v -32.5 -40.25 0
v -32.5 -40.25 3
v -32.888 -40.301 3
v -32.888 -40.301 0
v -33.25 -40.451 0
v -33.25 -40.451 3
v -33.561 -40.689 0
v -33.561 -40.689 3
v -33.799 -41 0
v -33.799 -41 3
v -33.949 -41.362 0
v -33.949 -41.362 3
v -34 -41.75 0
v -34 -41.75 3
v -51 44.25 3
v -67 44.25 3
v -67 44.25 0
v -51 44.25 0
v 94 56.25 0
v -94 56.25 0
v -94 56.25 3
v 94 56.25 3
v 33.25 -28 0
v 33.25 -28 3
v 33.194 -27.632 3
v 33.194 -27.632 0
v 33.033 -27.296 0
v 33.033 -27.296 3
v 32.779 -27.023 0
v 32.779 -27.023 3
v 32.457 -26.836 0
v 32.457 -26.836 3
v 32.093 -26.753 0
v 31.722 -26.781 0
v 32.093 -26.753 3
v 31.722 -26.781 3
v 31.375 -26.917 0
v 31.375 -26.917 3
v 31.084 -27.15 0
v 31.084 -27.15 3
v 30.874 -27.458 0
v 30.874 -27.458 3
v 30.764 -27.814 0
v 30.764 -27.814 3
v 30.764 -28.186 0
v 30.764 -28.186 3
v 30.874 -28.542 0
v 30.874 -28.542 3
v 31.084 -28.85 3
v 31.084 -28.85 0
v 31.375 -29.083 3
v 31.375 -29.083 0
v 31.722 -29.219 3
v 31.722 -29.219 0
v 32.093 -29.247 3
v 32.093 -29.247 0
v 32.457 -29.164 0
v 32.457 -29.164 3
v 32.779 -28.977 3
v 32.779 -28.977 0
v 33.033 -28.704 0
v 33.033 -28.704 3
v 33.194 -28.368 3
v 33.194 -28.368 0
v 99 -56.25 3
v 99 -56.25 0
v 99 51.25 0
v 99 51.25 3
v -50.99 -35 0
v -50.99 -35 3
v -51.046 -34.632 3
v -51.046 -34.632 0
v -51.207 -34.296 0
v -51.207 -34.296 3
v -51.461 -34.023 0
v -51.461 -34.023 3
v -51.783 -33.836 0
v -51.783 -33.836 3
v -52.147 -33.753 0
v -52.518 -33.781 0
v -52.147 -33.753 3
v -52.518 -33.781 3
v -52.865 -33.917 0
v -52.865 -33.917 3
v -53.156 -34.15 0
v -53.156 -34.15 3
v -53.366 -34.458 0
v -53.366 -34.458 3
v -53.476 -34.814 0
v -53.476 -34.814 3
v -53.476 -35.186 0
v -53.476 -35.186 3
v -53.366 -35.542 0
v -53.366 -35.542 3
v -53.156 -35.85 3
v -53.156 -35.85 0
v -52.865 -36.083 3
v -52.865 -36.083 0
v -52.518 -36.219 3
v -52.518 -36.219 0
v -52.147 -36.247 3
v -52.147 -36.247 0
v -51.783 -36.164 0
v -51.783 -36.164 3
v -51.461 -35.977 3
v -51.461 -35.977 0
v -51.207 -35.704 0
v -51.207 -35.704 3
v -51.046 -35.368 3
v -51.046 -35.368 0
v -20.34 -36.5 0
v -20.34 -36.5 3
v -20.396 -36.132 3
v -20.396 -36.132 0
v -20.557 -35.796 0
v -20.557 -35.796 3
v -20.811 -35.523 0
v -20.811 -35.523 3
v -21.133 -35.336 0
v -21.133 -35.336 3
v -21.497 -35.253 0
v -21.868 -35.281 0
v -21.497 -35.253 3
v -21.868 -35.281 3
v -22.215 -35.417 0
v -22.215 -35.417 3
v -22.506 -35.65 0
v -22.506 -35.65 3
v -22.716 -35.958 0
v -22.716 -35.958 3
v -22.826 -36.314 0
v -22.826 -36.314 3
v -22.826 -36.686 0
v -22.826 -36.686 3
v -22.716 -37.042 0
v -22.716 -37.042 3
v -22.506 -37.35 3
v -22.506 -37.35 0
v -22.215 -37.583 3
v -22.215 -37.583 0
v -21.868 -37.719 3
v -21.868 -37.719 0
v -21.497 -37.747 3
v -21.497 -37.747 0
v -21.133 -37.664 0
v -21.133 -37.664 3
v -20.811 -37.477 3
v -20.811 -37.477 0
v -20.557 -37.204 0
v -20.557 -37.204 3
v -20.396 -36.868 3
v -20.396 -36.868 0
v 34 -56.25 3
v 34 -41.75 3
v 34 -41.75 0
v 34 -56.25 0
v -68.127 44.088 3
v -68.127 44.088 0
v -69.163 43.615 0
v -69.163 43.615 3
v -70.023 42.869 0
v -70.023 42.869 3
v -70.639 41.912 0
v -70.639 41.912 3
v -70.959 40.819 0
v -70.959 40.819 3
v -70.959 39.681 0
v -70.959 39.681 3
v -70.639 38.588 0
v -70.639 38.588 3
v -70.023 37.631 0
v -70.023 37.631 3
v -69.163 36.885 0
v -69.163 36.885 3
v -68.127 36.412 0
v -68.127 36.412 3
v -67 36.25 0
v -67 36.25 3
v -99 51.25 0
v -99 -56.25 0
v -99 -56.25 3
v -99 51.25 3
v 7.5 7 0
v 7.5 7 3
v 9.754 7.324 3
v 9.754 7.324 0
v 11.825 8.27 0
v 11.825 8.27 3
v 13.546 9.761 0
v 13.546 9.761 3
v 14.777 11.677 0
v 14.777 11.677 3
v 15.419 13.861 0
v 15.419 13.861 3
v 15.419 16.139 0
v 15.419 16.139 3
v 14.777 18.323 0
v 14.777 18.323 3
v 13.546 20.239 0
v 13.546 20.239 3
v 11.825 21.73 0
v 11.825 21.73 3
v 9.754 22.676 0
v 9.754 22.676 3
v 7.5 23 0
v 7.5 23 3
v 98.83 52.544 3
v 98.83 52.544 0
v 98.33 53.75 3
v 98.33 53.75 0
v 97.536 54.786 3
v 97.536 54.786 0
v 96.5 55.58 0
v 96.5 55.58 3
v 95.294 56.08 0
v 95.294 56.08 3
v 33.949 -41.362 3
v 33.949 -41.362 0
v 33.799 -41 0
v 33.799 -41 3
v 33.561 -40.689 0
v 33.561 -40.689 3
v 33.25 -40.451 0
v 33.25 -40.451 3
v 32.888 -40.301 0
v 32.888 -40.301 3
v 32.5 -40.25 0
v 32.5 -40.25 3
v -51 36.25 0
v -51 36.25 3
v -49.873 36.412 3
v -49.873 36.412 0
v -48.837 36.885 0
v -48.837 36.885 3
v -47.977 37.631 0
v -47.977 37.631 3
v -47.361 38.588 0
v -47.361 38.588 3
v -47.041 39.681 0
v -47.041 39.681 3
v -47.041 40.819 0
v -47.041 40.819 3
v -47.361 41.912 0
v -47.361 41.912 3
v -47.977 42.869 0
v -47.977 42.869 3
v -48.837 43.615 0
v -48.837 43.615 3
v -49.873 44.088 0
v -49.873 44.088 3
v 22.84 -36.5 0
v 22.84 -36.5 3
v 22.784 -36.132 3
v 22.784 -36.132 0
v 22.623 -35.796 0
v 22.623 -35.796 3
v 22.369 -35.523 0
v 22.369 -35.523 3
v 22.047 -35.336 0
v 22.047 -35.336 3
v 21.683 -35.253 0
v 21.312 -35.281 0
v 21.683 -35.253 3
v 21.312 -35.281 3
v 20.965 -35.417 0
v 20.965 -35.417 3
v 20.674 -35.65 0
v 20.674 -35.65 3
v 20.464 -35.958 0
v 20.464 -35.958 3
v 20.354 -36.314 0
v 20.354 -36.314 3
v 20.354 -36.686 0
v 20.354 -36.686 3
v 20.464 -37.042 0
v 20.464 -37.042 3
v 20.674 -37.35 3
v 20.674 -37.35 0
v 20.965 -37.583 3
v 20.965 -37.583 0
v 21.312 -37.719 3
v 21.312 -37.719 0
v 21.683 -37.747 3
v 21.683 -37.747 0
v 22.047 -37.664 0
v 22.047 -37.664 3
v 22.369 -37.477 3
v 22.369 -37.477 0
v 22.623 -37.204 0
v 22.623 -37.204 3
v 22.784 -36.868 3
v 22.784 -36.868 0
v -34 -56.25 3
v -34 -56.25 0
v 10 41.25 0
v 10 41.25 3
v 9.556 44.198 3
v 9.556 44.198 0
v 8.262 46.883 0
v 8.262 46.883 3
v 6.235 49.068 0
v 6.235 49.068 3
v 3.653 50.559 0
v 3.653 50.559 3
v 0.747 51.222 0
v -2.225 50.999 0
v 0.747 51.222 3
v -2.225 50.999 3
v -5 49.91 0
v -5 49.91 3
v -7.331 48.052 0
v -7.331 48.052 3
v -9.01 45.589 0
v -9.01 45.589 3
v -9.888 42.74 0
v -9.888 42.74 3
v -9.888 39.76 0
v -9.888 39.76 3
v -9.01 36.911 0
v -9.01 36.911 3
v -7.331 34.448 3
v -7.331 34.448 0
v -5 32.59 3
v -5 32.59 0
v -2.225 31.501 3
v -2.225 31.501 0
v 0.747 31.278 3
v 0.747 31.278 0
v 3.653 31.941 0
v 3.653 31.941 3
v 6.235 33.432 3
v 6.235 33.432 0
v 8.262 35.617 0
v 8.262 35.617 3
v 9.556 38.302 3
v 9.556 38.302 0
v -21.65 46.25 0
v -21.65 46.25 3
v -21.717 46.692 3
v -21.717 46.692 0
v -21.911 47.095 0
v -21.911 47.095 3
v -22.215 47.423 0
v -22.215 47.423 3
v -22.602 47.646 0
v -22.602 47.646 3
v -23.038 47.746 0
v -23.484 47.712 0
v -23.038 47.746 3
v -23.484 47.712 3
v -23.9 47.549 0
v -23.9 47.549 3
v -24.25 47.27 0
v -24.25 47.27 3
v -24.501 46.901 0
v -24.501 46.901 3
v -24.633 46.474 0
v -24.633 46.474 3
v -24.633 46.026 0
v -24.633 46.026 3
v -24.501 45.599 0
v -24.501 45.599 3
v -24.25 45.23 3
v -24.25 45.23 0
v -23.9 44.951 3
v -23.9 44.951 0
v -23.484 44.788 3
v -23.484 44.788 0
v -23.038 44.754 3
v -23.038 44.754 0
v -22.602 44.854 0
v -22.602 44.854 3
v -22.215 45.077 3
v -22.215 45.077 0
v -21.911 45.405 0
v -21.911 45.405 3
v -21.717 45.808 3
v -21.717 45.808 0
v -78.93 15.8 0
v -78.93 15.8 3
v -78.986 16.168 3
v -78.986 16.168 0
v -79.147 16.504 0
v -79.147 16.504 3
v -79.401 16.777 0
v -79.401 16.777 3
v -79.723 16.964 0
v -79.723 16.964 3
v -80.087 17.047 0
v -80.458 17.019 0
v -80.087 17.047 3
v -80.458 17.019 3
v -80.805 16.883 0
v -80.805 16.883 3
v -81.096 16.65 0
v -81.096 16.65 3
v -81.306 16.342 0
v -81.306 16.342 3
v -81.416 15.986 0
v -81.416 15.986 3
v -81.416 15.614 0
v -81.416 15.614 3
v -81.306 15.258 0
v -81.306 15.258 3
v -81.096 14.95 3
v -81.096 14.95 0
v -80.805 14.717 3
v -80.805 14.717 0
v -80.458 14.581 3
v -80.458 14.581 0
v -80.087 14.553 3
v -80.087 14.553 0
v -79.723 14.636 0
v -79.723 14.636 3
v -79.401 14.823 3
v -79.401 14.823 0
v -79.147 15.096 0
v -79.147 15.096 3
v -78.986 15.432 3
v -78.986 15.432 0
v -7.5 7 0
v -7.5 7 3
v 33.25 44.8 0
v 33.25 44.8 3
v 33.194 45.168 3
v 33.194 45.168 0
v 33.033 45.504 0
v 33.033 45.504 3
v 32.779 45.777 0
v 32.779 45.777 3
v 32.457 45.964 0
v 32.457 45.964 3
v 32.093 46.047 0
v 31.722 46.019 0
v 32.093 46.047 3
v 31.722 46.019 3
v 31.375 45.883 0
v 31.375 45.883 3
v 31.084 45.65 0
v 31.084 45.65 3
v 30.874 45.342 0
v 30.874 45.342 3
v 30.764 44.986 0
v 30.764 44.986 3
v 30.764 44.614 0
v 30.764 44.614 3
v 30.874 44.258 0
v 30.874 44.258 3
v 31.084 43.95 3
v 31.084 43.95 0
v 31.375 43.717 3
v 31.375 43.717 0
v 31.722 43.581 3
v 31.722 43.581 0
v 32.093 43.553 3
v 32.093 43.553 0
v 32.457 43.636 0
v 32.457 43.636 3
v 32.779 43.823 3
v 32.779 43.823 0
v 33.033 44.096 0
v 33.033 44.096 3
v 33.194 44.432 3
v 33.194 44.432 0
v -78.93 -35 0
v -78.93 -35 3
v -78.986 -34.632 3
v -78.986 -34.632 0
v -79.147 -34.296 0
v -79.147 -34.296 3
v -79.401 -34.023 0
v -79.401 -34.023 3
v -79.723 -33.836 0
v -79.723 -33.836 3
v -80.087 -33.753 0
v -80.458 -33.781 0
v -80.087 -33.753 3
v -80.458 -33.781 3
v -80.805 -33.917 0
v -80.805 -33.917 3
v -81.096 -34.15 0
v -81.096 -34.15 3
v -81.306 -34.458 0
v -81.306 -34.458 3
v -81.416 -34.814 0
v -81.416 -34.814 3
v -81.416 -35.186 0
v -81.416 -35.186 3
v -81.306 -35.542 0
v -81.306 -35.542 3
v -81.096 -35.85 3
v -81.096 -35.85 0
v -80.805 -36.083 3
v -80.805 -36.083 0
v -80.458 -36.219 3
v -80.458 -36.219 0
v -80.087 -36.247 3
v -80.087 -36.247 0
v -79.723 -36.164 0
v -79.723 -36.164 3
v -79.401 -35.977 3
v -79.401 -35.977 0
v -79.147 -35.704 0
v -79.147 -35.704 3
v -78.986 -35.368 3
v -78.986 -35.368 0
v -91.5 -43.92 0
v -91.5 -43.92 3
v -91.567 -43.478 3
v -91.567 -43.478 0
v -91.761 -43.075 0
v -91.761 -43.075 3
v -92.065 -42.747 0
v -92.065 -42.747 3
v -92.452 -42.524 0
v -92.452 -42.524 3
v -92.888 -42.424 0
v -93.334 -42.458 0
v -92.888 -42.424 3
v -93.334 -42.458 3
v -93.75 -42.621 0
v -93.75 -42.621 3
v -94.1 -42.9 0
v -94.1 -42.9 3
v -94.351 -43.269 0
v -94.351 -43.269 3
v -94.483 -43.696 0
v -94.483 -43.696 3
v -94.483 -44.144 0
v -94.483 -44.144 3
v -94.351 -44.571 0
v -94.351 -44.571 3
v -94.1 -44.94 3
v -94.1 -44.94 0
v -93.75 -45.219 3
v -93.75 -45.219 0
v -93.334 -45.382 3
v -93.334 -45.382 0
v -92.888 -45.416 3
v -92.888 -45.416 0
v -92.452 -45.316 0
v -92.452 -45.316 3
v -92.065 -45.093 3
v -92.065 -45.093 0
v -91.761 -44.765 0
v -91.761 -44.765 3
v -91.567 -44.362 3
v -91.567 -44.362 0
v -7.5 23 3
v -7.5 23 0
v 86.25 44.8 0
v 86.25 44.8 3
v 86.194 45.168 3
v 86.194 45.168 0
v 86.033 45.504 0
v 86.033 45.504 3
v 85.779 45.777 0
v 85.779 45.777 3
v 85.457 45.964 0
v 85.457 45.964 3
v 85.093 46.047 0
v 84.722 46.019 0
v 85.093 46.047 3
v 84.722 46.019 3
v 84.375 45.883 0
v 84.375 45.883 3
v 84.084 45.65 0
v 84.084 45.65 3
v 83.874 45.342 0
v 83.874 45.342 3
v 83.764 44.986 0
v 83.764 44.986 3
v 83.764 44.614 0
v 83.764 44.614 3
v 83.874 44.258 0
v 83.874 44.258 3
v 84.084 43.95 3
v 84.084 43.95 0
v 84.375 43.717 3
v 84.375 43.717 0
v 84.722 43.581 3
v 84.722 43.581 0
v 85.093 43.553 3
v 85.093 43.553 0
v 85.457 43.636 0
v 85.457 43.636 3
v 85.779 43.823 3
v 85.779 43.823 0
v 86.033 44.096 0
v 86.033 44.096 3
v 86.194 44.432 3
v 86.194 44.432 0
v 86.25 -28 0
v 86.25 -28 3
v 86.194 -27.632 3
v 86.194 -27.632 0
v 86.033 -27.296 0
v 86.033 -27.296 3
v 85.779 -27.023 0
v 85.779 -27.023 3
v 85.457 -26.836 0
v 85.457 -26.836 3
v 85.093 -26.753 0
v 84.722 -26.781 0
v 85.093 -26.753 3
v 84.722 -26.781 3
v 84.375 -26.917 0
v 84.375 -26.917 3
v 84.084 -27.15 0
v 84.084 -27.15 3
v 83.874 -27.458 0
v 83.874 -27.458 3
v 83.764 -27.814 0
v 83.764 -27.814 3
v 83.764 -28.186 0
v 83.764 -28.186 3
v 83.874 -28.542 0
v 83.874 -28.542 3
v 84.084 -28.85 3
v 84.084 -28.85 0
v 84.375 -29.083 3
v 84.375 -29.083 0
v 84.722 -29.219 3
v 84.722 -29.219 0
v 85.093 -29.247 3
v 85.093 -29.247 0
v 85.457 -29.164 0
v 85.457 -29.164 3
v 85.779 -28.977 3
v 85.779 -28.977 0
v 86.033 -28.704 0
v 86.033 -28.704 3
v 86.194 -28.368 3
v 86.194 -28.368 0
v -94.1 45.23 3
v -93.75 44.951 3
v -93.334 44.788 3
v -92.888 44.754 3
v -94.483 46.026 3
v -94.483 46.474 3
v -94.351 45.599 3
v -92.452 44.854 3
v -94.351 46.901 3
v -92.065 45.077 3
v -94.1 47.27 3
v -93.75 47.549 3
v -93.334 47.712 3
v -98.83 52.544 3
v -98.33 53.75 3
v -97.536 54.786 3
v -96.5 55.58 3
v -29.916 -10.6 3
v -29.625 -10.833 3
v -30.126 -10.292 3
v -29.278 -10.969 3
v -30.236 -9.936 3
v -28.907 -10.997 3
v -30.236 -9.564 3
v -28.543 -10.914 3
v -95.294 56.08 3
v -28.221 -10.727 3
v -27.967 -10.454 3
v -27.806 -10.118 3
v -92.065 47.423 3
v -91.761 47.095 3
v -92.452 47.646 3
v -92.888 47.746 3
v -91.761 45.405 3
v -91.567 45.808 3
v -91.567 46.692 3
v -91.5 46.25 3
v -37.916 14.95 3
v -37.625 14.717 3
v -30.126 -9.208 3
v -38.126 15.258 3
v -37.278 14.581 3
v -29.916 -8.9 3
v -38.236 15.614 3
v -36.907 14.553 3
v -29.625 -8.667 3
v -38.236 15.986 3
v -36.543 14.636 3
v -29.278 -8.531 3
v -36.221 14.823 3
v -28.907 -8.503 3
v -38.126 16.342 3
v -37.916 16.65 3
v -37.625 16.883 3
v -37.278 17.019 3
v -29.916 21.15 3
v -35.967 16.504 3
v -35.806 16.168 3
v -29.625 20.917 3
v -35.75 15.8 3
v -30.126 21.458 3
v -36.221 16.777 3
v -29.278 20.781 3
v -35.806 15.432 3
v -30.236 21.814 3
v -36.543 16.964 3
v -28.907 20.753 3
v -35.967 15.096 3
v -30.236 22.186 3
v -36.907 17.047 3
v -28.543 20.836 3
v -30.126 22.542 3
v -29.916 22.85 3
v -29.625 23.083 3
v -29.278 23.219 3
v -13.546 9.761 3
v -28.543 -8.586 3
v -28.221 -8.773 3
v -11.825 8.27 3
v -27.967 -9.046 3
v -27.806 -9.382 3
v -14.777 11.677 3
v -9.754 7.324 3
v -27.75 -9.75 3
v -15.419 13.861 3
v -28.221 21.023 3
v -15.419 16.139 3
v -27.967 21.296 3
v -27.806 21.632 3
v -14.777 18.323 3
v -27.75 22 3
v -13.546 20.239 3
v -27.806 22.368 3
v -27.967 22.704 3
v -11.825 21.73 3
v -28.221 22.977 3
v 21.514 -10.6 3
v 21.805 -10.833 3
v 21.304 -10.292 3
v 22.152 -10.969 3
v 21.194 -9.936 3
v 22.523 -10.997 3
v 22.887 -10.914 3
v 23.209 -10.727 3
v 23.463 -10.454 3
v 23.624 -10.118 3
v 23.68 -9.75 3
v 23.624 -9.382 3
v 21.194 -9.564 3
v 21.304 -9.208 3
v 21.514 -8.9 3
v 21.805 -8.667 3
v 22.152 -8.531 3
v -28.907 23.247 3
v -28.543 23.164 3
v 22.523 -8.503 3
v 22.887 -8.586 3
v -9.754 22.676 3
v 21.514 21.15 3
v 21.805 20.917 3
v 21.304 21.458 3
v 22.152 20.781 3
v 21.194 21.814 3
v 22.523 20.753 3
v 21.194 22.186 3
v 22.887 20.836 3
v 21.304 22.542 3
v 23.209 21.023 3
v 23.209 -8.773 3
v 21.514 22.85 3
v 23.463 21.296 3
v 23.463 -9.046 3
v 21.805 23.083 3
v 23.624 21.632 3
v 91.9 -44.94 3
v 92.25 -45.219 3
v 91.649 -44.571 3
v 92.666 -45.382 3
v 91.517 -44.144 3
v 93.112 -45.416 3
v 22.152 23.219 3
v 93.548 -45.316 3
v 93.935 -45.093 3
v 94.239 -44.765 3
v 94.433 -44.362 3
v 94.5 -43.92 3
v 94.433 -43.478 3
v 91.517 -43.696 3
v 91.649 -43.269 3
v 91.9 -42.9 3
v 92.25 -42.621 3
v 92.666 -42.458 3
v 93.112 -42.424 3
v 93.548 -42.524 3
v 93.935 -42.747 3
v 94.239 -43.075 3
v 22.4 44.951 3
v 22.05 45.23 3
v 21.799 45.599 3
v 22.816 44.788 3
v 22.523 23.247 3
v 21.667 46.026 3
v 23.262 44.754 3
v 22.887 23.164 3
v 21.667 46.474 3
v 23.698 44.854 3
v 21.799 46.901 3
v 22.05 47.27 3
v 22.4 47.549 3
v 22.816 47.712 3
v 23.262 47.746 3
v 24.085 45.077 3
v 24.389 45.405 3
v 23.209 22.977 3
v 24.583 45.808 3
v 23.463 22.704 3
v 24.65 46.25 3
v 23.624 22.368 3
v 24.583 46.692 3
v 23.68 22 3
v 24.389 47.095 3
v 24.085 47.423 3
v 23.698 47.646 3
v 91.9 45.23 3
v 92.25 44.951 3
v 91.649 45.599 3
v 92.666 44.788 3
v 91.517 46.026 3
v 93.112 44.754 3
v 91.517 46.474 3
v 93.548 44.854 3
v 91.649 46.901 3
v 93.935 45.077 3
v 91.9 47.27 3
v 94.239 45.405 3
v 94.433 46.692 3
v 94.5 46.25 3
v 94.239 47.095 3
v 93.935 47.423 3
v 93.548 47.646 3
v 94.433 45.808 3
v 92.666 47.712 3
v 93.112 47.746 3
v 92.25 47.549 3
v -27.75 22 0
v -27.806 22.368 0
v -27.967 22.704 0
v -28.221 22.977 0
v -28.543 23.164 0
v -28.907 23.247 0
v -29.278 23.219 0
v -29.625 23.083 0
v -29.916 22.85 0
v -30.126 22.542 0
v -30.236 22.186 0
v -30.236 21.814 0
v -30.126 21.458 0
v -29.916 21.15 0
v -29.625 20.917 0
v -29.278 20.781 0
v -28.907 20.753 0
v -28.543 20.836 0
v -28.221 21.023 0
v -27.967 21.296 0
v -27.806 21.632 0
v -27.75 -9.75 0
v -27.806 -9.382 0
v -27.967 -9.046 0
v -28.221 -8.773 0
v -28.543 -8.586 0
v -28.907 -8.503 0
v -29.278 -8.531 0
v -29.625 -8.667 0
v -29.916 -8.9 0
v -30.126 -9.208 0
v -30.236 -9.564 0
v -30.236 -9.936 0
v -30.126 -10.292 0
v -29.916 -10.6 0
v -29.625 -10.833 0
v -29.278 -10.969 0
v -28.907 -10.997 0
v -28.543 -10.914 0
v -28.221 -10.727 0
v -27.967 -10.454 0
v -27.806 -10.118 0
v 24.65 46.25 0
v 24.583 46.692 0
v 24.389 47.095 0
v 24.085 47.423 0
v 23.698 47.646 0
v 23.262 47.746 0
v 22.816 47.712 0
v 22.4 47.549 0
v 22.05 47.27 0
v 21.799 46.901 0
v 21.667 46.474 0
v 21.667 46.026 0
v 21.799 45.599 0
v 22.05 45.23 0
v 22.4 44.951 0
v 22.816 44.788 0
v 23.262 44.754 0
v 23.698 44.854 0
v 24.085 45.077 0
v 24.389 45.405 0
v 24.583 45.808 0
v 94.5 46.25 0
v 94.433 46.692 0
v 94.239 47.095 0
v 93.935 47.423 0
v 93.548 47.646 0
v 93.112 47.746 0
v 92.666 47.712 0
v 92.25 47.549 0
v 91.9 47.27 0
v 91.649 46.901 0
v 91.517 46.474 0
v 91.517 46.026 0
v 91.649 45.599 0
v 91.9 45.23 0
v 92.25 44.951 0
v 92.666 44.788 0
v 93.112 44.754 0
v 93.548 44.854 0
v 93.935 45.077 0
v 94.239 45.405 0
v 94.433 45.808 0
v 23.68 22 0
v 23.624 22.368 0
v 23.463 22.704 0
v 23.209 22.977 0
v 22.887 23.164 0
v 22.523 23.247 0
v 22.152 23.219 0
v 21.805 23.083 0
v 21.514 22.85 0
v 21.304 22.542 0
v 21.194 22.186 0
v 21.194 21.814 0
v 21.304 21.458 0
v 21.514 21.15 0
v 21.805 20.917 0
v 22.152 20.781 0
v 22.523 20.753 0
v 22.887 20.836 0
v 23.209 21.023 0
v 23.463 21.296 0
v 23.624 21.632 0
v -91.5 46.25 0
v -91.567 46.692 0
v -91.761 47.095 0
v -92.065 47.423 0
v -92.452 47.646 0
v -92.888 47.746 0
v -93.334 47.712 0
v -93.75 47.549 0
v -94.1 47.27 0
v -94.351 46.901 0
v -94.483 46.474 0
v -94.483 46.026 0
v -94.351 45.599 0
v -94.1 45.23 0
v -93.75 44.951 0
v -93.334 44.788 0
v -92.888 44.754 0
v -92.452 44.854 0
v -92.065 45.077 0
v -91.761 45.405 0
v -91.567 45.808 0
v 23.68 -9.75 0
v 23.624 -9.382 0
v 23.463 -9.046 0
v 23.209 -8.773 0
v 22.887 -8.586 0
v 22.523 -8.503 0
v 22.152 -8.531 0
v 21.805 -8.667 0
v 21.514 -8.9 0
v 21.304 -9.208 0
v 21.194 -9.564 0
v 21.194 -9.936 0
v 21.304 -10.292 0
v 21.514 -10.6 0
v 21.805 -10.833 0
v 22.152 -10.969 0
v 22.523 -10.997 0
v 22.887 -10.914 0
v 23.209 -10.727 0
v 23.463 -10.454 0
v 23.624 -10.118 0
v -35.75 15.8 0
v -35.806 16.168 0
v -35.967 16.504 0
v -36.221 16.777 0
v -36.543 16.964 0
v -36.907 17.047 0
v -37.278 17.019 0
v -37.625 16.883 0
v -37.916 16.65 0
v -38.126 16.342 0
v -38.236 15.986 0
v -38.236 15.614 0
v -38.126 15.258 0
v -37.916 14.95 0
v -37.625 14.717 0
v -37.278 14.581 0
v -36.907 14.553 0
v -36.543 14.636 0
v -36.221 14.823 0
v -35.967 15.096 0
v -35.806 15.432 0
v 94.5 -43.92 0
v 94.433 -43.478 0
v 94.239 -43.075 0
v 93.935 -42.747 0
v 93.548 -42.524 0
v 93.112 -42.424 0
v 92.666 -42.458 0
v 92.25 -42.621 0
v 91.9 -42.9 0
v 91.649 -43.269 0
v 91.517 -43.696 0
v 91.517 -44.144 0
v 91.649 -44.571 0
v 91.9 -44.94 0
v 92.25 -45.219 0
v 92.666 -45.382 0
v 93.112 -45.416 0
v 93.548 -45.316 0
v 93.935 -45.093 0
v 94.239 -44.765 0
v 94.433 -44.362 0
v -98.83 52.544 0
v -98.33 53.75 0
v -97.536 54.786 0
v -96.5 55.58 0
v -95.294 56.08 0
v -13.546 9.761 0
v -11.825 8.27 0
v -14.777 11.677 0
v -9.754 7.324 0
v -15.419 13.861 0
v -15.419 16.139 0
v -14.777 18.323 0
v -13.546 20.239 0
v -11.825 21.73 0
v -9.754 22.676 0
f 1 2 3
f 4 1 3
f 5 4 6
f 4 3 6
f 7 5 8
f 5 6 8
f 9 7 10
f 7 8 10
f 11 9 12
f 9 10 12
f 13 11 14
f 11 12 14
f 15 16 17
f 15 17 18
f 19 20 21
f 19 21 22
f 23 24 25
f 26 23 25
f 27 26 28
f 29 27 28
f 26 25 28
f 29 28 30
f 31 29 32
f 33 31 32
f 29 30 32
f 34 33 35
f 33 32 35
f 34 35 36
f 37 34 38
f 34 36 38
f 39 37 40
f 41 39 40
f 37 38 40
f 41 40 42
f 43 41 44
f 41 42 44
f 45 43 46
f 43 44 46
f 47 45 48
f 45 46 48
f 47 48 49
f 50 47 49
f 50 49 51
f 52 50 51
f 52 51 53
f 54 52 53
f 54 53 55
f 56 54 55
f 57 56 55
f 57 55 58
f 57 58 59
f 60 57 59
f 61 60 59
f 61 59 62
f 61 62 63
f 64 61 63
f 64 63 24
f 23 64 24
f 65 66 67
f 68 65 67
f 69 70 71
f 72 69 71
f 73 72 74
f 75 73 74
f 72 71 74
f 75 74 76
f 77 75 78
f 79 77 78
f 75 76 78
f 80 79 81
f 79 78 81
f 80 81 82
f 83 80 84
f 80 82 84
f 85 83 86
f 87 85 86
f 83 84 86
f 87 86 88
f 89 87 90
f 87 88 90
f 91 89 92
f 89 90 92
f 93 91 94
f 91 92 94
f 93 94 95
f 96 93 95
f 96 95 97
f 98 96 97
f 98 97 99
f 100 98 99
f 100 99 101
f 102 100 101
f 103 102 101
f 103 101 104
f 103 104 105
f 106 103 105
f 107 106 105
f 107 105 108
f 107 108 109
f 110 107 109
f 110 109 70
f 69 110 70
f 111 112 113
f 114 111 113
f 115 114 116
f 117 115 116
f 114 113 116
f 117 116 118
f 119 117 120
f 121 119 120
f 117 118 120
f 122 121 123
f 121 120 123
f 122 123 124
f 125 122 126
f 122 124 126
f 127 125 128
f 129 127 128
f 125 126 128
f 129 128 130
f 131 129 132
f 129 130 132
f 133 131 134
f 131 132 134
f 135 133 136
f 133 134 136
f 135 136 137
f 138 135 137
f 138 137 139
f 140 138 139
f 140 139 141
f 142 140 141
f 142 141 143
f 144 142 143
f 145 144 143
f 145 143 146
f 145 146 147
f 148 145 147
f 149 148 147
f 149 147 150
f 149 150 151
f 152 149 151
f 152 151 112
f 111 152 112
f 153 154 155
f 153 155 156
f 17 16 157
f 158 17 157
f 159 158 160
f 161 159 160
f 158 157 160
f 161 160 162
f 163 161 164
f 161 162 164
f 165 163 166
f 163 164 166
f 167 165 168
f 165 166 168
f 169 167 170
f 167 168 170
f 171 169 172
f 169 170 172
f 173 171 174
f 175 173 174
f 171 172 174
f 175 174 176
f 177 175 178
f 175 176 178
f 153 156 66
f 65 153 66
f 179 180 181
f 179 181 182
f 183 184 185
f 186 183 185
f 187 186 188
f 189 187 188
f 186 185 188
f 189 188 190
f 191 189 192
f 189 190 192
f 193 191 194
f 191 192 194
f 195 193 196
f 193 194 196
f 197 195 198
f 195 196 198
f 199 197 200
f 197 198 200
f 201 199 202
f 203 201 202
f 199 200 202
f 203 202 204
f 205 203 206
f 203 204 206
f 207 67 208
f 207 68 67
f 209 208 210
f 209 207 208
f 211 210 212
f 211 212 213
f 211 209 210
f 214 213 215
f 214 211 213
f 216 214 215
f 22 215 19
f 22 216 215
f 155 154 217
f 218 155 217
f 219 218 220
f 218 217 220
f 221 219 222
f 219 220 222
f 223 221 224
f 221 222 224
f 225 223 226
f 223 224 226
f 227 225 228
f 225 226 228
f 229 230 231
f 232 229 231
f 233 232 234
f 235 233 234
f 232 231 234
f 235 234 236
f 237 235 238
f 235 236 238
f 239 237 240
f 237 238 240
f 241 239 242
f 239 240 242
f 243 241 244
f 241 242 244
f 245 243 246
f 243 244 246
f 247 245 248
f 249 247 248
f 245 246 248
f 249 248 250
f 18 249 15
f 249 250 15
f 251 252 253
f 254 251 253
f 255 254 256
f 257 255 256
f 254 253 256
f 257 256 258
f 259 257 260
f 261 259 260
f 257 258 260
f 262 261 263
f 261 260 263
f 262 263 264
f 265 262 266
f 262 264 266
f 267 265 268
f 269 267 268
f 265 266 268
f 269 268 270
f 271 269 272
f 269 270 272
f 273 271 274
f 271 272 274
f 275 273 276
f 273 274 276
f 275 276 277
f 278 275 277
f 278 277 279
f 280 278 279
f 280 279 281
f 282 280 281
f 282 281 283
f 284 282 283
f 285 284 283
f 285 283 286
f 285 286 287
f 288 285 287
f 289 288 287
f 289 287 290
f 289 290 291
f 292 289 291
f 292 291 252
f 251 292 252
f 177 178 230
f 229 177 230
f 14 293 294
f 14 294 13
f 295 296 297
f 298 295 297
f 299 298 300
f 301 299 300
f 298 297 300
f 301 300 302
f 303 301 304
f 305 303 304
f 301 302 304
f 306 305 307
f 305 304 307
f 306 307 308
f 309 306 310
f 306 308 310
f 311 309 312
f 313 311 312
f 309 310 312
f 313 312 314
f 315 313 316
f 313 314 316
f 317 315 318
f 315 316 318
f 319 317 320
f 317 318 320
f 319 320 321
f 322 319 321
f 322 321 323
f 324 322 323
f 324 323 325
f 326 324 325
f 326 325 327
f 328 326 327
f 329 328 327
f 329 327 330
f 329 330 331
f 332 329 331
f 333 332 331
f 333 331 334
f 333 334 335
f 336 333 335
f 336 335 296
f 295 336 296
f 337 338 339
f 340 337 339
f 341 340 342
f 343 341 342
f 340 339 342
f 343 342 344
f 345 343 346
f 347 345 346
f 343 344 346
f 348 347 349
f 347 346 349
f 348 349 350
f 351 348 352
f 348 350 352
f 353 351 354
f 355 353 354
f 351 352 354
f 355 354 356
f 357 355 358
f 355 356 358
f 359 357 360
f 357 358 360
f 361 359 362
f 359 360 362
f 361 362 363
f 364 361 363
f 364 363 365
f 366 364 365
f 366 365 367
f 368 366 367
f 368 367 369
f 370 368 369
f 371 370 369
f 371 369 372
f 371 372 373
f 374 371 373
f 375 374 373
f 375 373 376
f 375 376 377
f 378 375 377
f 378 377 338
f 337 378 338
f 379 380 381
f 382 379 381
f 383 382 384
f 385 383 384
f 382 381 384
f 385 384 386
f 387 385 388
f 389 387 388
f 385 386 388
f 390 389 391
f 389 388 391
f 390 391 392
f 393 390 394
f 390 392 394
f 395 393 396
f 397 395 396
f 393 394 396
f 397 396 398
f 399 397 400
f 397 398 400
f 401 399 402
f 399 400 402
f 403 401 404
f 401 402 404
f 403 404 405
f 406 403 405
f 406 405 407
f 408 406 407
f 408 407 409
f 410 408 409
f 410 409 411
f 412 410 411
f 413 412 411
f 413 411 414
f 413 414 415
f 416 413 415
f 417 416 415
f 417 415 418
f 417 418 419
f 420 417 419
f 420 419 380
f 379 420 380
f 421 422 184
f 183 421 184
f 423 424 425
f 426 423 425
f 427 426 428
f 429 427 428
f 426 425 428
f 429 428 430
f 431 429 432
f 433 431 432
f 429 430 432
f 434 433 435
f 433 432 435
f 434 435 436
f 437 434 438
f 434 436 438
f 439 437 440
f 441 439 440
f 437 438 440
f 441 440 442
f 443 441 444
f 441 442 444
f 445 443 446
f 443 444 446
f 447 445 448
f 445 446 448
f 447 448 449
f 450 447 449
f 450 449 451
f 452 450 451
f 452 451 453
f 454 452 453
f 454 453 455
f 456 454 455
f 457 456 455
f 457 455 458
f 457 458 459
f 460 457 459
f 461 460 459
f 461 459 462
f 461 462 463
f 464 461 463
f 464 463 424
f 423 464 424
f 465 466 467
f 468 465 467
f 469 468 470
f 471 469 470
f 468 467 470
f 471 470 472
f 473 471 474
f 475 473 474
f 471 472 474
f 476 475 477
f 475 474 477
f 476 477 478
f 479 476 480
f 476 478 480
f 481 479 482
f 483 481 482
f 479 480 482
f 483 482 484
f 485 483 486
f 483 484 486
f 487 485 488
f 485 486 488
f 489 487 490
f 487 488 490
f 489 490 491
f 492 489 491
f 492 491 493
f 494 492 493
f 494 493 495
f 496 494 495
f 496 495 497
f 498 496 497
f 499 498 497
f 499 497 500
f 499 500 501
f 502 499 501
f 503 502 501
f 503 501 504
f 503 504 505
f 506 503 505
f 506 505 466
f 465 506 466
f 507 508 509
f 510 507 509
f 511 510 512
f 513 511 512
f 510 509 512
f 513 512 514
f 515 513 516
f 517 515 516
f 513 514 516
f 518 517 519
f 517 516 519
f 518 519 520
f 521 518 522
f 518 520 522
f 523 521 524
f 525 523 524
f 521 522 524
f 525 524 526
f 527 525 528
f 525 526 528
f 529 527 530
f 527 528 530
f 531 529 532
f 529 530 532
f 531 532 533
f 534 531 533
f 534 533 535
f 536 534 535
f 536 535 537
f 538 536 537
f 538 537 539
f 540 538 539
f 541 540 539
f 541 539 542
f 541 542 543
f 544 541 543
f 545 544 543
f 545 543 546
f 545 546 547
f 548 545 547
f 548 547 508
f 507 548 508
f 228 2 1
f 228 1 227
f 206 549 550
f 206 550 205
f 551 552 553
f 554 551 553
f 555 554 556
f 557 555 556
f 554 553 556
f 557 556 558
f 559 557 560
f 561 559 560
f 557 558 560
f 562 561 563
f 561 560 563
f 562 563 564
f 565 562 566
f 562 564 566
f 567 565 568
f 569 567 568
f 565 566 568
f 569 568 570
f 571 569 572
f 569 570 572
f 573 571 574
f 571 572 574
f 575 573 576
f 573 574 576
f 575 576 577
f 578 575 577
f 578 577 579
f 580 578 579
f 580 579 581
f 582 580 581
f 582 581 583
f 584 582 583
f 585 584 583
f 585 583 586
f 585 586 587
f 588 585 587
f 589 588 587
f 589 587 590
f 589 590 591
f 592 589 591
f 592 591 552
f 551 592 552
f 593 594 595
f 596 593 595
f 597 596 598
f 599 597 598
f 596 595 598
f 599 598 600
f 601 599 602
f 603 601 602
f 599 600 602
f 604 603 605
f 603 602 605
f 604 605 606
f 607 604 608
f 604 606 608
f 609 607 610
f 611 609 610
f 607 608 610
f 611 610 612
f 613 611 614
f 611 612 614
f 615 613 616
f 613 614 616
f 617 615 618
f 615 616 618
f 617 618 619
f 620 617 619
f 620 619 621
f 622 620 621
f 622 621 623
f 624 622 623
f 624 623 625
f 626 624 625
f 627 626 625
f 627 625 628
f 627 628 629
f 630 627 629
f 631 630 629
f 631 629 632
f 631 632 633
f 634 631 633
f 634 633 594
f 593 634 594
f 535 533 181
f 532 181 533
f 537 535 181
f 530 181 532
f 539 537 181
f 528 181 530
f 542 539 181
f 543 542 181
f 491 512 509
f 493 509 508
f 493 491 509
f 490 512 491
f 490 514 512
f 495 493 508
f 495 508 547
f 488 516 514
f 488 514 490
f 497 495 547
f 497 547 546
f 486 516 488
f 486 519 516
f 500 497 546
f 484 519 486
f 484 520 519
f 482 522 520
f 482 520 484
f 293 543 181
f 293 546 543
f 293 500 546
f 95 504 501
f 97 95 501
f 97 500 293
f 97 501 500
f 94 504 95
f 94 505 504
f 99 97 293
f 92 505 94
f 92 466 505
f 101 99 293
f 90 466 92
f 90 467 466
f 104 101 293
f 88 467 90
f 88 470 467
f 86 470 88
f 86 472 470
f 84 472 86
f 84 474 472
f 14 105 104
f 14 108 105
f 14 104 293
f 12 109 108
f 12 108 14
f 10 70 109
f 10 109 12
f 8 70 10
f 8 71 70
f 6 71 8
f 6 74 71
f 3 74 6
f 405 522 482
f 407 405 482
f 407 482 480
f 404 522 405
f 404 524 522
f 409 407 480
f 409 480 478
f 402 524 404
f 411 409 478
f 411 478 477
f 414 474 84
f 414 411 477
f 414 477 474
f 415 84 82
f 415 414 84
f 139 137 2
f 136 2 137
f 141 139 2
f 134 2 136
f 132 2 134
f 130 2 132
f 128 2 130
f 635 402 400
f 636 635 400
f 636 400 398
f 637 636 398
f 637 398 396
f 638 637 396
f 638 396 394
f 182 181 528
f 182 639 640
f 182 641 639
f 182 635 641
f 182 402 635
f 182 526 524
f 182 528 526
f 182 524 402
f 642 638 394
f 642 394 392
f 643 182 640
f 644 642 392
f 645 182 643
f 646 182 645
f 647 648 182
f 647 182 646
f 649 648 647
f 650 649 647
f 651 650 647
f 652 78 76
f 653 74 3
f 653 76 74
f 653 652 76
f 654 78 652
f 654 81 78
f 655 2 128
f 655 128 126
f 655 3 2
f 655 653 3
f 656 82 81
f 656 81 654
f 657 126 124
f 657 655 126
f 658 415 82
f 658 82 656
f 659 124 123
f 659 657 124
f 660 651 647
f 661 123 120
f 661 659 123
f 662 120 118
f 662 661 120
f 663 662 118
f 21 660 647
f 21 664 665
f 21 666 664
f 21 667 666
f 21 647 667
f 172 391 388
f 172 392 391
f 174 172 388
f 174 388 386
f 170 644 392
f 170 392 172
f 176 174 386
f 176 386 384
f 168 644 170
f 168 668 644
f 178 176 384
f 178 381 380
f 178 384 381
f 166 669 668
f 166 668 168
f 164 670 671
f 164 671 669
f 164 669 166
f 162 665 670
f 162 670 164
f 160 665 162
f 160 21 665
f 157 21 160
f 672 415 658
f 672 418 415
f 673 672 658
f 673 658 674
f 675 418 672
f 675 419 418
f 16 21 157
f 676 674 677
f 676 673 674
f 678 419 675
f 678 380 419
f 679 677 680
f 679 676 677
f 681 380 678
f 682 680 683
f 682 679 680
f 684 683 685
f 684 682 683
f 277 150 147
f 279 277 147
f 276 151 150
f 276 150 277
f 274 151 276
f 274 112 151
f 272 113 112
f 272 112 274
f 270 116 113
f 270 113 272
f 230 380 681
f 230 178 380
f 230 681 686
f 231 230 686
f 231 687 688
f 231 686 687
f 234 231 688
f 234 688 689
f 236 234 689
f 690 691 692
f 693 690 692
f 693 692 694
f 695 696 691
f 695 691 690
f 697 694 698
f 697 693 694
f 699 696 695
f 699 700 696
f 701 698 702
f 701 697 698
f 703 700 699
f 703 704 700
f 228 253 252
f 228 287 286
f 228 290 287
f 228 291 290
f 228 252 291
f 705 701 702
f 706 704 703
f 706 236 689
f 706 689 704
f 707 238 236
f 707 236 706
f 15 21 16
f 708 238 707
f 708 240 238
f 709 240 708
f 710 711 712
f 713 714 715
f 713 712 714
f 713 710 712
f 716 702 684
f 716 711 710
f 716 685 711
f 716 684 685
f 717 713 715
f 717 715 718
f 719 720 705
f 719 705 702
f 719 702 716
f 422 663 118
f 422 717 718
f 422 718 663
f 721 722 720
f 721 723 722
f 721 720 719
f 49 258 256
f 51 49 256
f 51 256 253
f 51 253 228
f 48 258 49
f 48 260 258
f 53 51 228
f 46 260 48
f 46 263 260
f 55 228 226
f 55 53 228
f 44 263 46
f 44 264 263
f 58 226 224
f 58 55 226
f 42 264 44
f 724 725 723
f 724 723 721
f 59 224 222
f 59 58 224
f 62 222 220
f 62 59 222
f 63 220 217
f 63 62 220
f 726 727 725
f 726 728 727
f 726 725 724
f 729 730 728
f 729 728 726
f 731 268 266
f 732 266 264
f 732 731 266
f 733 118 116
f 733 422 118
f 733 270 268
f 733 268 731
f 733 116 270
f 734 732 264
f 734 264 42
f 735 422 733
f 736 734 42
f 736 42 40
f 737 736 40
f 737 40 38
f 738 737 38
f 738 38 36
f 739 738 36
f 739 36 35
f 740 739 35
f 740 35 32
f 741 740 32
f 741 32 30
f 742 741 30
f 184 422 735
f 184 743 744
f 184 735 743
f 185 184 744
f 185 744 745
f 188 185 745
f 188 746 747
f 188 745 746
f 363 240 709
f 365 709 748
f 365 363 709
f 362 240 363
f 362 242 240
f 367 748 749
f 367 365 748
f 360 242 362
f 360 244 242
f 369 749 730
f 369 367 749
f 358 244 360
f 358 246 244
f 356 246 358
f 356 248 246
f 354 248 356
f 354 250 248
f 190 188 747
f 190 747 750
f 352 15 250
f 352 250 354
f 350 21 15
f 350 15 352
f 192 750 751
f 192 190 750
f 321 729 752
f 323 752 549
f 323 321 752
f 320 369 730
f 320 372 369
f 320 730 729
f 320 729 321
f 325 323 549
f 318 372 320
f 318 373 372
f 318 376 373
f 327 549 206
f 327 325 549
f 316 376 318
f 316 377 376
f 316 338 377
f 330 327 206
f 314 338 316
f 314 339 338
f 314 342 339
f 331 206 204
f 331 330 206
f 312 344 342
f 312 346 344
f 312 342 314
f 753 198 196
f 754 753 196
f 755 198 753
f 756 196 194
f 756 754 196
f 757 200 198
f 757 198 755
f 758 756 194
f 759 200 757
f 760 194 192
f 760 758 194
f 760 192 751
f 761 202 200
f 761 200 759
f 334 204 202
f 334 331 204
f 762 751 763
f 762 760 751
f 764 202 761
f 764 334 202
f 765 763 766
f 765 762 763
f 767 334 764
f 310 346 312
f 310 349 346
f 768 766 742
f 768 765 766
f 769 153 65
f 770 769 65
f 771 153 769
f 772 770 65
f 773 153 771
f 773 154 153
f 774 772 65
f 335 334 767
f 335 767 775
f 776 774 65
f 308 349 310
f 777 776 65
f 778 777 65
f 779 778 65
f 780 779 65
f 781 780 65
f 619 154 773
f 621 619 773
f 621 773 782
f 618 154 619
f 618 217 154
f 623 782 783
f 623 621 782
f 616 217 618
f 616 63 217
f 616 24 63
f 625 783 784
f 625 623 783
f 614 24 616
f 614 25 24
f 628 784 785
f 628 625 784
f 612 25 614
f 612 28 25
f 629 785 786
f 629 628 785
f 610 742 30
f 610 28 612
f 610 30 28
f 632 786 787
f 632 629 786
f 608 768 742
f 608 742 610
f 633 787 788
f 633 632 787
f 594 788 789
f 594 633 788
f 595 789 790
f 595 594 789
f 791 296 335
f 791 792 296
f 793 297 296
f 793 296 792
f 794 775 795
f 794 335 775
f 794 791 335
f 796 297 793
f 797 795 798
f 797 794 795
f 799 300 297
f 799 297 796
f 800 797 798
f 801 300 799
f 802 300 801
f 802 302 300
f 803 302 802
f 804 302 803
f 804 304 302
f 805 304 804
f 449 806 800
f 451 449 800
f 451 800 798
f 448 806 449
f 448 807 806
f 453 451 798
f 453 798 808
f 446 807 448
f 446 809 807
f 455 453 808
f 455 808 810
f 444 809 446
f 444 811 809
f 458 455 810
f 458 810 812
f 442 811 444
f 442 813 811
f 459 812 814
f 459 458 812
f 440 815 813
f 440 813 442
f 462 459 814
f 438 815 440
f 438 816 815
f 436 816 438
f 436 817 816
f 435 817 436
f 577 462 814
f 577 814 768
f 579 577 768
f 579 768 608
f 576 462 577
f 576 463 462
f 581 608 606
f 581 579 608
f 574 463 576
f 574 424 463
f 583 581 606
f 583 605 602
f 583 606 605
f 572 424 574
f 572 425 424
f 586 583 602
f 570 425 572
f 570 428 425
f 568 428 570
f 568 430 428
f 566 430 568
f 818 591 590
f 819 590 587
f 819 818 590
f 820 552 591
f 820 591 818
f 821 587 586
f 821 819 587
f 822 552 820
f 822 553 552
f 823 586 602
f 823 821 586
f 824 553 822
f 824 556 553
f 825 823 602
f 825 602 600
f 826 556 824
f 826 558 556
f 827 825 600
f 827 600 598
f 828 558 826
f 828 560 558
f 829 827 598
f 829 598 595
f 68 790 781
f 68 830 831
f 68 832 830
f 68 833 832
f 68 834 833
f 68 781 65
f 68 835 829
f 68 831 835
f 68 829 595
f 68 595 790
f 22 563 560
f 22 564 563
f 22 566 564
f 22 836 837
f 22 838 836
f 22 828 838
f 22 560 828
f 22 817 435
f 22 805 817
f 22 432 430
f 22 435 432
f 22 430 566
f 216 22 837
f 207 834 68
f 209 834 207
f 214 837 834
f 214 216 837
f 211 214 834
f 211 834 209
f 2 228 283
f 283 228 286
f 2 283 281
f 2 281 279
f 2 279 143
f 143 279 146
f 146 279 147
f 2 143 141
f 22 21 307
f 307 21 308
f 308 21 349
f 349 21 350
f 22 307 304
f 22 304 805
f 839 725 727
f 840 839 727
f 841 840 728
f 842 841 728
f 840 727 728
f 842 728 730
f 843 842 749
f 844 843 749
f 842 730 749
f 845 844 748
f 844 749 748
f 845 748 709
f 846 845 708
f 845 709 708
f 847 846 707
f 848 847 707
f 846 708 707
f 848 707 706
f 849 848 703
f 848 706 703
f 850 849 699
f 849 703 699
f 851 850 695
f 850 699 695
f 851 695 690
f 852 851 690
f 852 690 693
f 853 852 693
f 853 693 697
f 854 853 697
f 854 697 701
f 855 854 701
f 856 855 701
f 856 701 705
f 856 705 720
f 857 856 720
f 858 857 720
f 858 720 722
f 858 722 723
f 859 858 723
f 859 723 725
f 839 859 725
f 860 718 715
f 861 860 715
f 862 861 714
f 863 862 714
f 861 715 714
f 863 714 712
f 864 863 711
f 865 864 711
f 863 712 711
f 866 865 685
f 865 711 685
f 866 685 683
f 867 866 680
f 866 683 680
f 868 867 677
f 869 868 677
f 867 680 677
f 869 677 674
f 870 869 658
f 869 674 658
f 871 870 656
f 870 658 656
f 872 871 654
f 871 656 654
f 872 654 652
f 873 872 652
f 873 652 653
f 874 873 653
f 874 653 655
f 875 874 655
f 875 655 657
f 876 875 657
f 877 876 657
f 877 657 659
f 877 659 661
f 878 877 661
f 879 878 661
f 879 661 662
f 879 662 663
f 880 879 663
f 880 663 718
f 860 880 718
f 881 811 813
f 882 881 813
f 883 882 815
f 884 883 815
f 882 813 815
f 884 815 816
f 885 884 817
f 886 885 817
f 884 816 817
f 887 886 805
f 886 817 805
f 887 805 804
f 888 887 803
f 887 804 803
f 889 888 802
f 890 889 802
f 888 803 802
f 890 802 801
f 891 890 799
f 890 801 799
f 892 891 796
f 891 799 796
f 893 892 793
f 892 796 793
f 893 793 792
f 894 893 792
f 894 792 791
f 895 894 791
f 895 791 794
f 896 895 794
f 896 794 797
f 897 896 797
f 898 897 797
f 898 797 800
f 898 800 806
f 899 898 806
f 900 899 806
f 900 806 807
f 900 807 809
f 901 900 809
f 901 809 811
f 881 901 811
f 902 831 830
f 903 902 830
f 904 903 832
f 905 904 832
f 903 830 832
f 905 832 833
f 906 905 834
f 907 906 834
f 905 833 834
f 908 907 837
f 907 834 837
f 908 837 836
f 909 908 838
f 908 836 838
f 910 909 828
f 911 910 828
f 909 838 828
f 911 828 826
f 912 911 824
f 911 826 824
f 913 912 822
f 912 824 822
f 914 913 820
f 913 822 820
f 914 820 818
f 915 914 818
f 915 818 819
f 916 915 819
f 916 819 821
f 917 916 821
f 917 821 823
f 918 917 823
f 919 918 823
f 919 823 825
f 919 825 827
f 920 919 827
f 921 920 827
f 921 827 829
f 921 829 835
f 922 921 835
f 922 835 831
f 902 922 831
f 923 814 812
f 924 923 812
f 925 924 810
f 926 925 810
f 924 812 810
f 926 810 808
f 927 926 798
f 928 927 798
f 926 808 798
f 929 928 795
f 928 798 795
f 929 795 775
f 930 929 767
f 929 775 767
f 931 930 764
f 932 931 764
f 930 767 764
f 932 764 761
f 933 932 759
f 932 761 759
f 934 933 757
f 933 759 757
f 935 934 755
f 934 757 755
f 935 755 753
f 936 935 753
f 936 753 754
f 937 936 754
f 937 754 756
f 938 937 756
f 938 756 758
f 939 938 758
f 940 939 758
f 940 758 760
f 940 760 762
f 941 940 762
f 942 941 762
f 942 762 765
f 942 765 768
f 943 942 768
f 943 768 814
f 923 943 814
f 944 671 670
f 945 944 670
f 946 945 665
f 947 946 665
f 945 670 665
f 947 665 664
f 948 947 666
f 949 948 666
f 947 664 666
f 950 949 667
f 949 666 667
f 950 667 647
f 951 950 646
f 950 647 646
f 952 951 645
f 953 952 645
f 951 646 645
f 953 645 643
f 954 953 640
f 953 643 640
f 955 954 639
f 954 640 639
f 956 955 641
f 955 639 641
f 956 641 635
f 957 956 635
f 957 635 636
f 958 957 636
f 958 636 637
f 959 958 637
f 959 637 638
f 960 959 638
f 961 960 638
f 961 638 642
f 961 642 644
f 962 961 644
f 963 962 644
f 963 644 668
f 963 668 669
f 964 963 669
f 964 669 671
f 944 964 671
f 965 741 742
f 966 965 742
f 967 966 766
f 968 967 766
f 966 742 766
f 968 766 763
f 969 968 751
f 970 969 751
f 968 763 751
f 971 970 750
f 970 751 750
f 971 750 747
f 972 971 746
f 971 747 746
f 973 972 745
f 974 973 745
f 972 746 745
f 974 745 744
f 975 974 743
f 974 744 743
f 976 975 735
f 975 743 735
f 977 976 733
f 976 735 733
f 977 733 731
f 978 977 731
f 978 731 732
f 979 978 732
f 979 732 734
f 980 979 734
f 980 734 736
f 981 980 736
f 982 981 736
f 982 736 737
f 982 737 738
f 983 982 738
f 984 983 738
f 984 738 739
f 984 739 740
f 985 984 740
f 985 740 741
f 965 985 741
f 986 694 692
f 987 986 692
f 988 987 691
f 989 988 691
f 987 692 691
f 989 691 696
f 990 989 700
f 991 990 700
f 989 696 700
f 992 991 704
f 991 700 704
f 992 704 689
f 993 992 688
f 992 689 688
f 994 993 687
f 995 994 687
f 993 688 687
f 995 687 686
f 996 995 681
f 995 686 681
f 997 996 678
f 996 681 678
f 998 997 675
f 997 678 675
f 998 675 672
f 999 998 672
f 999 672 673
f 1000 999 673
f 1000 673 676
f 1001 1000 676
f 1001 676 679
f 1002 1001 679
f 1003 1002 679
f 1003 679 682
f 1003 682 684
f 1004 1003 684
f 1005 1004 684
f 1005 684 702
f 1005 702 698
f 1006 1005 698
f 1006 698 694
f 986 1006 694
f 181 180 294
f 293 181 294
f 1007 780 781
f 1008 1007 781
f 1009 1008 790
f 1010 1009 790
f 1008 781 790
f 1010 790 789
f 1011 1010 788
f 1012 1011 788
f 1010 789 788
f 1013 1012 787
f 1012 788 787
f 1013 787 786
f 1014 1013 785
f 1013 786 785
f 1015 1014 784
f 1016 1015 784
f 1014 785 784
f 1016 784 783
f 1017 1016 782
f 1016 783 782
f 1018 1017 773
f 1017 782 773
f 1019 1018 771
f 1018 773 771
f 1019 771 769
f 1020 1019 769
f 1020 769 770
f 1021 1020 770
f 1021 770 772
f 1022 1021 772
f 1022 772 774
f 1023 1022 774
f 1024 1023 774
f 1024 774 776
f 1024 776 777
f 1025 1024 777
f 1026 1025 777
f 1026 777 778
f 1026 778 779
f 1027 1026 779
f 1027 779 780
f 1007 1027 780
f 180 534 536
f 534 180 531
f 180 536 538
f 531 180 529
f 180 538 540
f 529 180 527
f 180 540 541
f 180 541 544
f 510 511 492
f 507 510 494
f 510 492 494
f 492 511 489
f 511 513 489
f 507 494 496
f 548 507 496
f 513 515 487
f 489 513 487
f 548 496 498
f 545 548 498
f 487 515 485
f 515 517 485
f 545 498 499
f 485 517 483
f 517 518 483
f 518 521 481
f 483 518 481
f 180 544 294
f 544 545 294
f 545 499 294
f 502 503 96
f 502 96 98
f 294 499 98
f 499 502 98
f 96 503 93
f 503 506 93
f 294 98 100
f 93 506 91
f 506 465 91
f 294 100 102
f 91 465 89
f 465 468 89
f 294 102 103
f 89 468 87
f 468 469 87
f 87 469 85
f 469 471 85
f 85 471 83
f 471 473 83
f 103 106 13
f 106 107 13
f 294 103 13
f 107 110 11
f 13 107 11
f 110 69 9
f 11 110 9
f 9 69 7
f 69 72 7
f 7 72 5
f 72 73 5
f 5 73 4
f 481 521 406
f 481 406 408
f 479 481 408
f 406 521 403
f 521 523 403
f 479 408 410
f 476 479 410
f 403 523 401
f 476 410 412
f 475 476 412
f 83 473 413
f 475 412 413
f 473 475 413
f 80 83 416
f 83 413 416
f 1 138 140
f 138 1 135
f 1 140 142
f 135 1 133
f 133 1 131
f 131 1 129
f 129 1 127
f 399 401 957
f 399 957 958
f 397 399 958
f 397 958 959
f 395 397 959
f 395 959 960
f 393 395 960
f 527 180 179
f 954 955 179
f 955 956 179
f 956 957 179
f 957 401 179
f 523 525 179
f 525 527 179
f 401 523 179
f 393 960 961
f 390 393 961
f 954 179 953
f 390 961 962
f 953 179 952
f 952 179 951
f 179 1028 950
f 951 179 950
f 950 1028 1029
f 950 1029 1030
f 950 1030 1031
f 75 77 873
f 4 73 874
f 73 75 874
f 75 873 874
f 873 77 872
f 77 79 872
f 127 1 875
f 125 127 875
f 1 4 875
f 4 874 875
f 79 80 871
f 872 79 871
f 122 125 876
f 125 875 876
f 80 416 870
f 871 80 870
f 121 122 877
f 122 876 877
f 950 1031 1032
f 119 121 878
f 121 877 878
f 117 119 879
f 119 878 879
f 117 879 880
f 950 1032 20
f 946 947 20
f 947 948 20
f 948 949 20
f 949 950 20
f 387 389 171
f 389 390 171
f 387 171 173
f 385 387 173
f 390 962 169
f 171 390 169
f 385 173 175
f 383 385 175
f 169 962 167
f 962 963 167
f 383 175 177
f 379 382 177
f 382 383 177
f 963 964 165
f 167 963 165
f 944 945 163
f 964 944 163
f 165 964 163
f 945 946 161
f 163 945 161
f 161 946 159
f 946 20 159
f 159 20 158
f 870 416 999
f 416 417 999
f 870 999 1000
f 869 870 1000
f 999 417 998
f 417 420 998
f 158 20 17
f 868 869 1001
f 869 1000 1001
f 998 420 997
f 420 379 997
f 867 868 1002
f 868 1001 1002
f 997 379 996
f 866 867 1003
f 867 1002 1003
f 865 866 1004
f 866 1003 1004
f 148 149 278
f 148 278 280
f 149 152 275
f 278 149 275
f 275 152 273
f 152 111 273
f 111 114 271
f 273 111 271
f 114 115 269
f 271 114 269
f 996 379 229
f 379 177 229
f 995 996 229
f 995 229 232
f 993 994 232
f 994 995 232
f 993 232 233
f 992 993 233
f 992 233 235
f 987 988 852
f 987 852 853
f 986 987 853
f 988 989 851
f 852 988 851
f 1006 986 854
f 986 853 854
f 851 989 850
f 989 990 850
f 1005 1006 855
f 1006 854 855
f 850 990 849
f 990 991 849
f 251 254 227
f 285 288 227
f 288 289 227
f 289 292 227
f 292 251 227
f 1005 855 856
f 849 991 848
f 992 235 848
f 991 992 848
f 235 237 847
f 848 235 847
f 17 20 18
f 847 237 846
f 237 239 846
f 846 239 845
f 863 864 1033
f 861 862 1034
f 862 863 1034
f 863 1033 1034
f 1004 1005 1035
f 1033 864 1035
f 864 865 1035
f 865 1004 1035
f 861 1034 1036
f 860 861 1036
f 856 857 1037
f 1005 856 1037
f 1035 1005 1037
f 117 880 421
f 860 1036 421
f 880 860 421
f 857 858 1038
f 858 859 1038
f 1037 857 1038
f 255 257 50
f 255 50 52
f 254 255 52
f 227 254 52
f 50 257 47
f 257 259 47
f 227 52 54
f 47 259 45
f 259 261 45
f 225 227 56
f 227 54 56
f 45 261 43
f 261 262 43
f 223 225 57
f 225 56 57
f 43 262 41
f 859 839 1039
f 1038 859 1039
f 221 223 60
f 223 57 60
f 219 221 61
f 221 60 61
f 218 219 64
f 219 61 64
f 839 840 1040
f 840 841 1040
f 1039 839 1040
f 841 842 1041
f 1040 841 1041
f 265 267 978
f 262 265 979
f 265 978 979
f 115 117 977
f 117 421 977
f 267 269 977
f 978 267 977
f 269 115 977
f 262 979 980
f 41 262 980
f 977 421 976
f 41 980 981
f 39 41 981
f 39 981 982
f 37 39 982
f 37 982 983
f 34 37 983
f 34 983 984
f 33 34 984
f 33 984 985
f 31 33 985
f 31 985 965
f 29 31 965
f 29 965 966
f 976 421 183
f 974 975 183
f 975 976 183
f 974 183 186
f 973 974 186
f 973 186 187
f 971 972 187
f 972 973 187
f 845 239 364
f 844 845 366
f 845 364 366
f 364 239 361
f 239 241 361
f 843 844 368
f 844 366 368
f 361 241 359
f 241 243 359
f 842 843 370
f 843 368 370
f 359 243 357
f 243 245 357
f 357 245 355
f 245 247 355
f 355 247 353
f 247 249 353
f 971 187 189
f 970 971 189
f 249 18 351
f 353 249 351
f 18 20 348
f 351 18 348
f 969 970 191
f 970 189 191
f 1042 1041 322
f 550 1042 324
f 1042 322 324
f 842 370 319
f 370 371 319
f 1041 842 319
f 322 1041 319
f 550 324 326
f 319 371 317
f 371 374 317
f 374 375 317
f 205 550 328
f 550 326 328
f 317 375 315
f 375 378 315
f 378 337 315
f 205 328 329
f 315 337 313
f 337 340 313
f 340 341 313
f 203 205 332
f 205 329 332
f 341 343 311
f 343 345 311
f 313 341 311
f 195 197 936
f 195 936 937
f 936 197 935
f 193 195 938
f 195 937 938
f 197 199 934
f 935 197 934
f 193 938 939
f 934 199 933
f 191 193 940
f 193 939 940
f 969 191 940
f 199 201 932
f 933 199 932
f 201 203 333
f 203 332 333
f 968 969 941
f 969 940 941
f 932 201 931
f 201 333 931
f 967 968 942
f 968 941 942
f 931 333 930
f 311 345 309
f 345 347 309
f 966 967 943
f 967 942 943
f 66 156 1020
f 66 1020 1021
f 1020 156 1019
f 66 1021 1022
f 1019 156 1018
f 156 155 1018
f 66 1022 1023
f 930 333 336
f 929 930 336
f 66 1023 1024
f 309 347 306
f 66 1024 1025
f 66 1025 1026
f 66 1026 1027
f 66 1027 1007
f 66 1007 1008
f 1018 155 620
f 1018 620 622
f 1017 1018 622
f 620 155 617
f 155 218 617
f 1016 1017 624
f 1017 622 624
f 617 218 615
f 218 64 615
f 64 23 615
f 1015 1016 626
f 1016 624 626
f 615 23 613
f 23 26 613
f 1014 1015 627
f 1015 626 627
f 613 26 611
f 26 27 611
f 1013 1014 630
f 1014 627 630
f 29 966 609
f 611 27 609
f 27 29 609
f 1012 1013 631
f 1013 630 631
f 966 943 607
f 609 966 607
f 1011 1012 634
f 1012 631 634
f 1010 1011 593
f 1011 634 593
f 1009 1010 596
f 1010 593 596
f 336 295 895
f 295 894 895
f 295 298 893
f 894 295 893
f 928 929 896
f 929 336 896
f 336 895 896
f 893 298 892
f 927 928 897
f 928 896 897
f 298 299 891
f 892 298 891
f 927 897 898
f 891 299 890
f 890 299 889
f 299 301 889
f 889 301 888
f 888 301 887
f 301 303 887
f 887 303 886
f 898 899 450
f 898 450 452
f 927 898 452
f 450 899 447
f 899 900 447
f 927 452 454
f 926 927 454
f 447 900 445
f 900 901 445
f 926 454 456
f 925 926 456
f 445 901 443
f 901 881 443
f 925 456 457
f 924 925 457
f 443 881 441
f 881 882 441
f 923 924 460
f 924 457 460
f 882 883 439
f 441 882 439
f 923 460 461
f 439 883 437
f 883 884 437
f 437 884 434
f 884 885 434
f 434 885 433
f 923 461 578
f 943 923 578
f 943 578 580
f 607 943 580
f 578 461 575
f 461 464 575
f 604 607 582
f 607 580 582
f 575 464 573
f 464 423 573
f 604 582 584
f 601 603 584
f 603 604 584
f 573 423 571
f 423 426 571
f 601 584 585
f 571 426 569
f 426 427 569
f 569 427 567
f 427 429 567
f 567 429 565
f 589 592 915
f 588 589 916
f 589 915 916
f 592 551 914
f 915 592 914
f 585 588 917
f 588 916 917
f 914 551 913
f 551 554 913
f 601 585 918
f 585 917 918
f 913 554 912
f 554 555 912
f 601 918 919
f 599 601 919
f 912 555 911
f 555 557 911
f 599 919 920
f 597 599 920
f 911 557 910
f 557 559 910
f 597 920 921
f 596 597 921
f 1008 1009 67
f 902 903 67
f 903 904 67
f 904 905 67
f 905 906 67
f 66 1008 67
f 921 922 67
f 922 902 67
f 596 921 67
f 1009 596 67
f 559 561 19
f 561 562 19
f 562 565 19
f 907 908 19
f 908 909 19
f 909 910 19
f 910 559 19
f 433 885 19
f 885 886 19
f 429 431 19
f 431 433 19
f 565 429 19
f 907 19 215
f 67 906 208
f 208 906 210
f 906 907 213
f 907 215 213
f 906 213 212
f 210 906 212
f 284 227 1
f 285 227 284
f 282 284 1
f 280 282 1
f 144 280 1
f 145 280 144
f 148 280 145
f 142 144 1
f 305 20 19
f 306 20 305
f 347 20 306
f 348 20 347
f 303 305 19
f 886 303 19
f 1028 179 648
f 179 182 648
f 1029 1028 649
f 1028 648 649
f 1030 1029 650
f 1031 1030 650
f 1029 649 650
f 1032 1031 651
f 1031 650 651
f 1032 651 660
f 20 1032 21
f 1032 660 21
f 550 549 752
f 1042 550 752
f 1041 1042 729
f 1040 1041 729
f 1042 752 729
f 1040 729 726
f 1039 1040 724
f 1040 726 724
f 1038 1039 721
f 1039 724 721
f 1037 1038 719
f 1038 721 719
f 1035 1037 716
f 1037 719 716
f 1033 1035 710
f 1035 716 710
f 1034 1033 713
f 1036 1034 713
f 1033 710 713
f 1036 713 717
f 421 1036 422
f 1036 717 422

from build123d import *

# Parameters (mm, degrees)
SKETCH_W      = 198
SKETCH_H      = 112.5
PAD_DEPTH     = 3
FILLET_R      = 5
SKETCH001_R   = 1.5
SKETCH001_R_2 = 10
SKETCH001_R_3 = 1.25
POCKET_DEPTH  = 3.001


with BuildPart() as part:
    # Sketch → Pad (new body)
    with BuildSketch(Plane.XY):
        Rectangle(SKETCH_W, SKETCH_H)
    extrude(amount=PAD_DEPTH)

    # Fillet
    fillet_edges = [part.edges().sort_by_distance(p)[0] for p in [
        (-99, 56.25, 1.5),
        (99, 56.25, 1.5),
    ]]
    fillet(fillet_edges, radius=FILLET_R)

    # Sketch001 (on Face5 of Fillet) → Pocket (cut, through all)
    with BuildSketch(Plane.XY.offset(3)):
        with Locations((-93, 46.25)):
            Circle(SKETCH001_R)
        with Locations((-93, -43.92)):
            Circle(SKETCH001_R)
        with Locations((93, 46.25)):
            Circle(SKETCH001_R)
        with Locations((93, -43.92)):
            Circle(SKETCH001_R)
        with Locations((-23.15, 46.25)):
            Circle(SKETCH001_R)
        with Locations((23.15, 46.25)):
            Circle(SKETCH001_R)
        with Locations((0, 41.25)):
            Circle(SKETCH001_R_2)
        with Locations((-21.59, -36.5)):
            Circle(SKETCH001_R_3)
        with Locations((21.59, -36.5)):
            Circle(SKETCH001_R_3)
        with Locations((-29, 22)):
            Circle(SKETCH001_R_3)
        with Locations((-29, -9.75)):
            Circle(SKETCH001_R_3)
        with Locations((22.43, -9.75)):
            Circle(SKETCH001_R_3)
        with Locations((22.43, 22)):
            Circle(SKETCH001_R_3)
        with Locations((-80.18, 15.8)):
            Circle(SKETCH001_R_3)
        with Locations((-37, 15.8)):
            Circle(SKETCH001_R_3)
        with Locations((-80.18, -35)):
            Circle(SKETCH001_R_3)
        with Locations((32, 44.8)):
            Circle(SKETCH001_R_3)
        with Locations((85, 44.8)):
            Circle(SKETCH001_R_3)
        with Locations((32, -28)):
            Circle(SKETCH001_R_3)
        with Locations((85, -28)):
            Circle(SKETCH001_R_3)
        with Locations((-52.24, -35)):
            Circle(SKETCH001_R_3)
        with BuildLine():
            Line((-32.5, -40.25), (32.5, -40.25))
            ThreePointArc((34, -41.75), (33.56066, -40.68934), (32.5, -40.25))
            Line((34, -41.75), (34, -56.25))
            Line((34, -56.25), (-34, -56.25))
            Line((-34, -56.25), (-34, -41.75))
            ThreePointArc((-32.5, -40.25), (-33.56066, -40.68934), (-34, -41.75))
        make_face()
        with BuildLine():
            ThreePointArc((-67, 44.25), (-71, 40.25), (-67, 36.25))
            Line((-67, 36.25), (-51, 36.25))
            ThreePointArc((-51, 36.25), (-47, 40.25), (-51, 44.25))
            Line((-67, 44.25), (-51, 44.25))
        make_face()
        with BuildLine():
            ThreePointArc((-7.5, 23), (-15.5, 15), (-7.5, 7))
            Line((-7.5, 7), (7.5, 7))
            ThreePointArc((7.5, 7), (15.5, 15), (7.5, 23))
            Line((-7.5, 23), (7.5, 23))
        make_face()
    extrude(amount=-POCKET_DEPTH, mode=Mode.SUBTRACT)


solid = part.part
